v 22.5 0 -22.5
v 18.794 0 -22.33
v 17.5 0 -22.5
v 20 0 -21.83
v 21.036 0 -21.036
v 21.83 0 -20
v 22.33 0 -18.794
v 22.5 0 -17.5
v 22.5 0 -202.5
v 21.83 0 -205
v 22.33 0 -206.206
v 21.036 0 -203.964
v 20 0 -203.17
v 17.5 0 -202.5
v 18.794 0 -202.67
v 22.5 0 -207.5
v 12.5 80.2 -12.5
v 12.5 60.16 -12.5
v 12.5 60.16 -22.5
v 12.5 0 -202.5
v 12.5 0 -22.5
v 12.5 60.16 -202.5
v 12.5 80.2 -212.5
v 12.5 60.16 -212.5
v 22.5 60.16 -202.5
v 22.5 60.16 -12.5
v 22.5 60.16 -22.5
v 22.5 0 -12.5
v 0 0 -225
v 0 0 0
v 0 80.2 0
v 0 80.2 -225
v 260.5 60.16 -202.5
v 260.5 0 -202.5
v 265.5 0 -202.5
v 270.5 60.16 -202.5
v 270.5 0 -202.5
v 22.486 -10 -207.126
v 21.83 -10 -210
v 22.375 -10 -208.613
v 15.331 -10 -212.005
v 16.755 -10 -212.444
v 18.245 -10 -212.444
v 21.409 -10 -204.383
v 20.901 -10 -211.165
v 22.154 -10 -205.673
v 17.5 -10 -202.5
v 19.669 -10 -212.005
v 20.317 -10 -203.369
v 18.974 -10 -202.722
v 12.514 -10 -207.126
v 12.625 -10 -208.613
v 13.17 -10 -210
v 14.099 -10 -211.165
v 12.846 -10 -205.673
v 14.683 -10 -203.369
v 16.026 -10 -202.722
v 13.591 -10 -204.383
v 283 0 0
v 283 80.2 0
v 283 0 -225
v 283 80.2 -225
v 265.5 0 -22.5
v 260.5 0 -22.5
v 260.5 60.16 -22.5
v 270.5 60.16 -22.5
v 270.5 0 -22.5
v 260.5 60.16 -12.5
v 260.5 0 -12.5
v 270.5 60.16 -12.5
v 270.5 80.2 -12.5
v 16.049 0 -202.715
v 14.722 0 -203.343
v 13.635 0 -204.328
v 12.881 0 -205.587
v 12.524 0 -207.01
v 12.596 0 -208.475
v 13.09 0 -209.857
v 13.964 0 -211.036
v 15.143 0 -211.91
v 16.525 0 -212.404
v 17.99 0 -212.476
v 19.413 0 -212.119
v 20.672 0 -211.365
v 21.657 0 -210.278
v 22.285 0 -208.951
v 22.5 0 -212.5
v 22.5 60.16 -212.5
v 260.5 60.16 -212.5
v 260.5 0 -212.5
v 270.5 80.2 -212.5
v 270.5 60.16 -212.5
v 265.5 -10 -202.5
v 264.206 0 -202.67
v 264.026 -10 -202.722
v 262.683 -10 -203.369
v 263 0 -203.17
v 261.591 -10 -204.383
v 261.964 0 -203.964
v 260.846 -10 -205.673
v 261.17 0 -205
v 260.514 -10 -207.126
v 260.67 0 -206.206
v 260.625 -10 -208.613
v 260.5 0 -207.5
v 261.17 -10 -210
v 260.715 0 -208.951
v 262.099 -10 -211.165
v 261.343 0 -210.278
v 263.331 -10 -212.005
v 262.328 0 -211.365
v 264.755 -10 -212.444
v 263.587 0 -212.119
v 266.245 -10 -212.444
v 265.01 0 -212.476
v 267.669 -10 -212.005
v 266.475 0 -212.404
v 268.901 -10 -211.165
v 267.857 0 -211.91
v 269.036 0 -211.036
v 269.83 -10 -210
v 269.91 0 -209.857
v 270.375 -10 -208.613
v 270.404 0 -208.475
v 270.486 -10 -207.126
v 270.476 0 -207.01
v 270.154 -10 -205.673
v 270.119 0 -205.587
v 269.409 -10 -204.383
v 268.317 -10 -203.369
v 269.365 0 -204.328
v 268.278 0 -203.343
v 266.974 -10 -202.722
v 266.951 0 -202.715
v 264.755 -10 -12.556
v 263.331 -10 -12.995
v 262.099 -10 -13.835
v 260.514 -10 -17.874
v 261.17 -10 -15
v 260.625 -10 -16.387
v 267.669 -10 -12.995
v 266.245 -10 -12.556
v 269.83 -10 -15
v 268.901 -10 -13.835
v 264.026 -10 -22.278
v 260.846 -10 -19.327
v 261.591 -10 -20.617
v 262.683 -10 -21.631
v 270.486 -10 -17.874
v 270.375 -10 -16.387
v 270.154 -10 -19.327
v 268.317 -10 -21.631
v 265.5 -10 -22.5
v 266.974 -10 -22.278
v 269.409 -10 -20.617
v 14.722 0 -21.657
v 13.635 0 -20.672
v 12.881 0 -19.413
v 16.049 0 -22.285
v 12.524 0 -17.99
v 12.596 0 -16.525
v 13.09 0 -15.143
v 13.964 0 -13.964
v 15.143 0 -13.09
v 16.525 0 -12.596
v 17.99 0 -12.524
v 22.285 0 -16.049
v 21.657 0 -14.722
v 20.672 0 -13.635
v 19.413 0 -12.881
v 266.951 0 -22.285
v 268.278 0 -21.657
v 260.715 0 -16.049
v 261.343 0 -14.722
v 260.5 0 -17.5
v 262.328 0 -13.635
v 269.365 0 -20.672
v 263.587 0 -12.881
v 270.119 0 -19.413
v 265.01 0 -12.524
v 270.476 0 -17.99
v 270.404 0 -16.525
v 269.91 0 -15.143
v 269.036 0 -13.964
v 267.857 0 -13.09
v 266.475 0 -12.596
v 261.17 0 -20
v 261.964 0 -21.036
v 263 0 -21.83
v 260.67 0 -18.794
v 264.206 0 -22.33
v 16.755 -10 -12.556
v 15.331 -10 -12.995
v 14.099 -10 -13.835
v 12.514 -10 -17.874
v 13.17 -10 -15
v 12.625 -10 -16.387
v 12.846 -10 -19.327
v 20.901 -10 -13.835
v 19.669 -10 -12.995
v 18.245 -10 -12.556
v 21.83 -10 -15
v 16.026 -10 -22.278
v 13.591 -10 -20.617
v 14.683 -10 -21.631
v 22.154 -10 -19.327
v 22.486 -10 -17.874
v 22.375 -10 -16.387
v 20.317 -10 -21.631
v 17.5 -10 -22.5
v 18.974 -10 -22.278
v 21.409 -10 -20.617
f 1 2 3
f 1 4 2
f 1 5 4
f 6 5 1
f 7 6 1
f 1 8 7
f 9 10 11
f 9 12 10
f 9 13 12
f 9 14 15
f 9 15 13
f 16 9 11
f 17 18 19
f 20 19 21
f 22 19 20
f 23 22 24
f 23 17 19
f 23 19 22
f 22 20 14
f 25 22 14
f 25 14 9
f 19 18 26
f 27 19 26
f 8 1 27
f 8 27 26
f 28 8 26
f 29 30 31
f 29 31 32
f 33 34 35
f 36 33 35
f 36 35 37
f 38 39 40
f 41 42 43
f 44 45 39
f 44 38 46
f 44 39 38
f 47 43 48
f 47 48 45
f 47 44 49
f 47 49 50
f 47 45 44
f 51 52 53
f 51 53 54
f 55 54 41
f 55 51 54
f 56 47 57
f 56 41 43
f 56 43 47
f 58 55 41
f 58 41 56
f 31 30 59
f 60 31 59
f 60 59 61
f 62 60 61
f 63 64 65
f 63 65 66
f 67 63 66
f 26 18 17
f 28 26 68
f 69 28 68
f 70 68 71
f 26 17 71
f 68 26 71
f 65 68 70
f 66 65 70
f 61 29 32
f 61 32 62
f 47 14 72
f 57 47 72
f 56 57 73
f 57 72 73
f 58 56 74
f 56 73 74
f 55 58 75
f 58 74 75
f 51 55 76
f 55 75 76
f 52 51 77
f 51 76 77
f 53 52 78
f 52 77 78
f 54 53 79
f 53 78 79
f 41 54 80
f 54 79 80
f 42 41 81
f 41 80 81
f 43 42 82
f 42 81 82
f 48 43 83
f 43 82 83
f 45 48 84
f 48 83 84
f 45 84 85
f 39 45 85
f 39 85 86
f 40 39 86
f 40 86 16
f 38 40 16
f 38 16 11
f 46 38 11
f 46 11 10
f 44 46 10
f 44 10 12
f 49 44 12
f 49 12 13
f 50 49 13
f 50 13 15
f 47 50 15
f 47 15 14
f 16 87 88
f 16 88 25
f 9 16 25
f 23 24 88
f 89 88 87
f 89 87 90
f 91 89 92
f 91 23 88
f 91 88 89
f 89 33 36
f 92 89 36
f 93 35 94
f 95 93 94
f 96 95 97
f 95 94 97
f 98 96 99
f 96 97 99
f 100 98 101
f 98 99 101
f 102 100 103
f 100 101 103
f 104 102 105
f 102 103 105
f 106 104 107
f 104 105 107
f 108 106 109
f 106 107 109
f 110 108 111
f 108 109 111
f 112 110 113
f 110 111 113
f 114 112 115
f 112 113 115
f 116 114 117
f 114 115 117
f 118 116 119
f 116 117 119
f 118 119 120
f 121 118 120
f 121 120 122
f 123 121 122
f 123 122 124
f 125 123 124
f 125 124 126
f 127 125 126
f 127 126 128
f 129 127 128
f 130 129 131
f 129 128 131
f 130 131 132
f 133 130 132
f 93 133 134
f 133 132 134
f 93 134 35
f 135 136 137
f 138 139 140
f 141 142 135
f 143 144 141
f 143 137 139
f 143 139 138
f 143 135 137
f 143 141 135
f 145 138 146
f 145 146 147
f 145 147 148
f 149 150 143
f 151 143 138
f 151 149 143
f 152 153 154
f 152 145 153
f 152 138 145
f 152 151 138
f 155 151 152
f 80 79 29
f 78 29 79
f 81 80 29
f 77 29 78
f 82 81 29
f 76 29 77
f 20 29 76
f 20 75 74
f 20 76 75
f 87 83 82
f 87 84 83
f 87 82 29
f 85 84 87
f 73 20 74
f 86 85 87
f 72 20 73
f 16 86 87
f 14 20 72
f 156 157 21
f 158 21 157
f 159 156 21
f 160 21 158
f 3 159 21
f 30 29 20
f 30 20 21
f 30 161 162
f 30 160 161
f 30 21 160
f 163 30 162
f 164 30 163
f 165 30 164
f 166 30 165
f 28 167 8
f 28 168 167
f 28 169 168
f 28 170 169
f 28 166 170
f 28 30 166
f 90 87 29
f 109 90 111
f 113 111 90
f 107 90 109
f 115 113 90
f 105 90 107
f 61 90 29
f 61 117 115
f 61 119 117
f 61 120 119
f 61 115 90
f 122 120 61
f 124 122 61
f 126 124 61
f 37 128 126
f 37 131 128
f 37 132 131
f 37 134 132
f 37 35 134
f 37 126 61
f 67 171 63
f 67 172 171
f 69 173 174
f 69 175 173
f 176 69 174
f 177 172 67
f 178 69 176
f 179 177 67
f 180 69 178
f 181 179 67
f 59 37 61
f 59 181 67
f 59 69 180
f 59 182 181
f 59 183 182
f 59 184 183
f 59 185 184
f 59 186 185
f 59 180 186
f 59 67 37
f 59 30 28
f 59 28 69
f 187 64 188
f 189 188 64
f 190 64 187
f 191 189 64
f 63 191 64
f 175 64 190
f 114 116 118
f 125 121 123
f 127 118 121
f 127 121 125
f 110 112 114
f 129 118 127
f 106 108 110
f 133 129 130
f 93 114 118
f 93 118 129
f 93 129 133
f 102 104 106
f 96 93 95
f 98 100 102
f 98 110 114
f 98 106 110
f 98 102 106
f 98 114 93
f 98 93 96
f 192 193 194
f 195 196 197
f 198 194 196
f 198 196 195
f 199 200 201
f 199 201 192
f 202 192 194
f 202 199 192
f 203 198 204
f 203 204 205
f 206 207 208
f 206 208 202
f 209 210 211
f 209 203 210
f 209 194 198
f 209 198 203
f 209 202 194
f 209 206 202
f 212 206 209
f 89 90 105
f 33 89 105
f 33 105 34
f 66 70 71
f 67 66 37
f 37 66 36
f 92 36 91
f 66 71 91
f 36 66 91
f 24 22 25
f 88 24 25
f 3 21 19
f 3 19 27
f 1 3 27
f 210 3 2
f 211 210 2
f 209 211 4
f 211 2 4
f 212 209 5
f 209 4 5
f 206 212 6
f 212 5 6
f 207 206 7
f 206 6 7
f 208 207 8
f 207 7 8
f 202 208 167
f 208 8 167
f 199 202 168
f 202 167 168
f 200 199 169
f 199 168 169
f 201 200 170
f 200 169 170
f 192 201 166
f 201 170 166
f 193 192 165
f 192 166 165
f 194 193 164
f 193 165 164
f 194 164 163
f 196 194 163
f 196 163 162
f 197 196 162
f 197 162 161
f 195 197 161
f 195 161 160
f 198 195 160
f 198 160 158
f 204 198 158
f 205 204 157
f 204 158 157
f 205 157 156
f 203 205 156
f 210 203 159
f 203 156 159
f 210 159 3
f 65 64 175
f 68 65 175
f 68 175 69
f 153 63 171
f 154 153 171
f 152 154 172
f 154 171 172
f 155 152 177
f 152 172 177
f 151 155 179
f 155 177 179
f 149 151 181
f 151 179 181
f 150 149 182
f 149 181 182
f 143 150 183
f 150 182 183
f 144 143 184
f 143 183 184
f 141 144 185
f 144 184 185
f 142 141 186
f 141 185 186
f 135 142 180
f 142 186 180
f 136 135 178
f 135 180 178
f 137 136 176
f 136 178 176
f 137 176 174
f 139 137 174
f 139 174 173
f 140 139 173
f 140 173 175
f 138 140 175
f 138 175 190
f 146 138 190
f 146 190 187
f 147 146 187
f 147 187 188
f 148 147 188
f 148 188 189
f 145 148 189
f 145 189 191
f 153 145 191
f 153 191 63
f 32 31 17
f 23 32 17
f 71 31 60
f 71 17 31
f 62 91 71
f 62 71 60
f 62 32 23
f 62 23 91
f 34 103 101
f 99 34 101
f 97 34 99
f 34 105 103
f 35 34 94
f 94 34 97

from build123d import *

# Parameters (mm, degrees)
SKETCH1_W           = 283
SKETCH1_H           = 225
BOSS_EXTRUDE1_DEPTH = 80.2
SKETCH2_W           = 258
SKETCH2_H           = 200
CUT_EXTRUDE1_DEPTH  = 80.2
SKETCH3_W           = 10
SKETCH3_H           = 10
BOSS_EXTRUDE2_DEPTH = 60.16
SKETCH4_R           = 5
BOSS_EXTRUDE3_DEPTH = 10


with BuildPart() as part:
    # Sketch1 → Boss-Extrude1 (new body)
    with BuildSketch(Plane(origin=(0, 0, 0), x_dir=(1, 0, 0), z_dir=(0, 1, 0))):
        with Locations((141.5, 112.5)):
            Rectangle(SKETCH1_W, SKETCH1_H)
    extrude(amount=BOSS_EXTRUDE1_DEPTH)

    # Sketch2 → Cut-Extrude1 (cut)
    with BuildSketch(Plane(origin=(0, 80.2, 0), x_dir=(1, 0, 0), z_dir=(0, 1, 0))):
        with Locations((141.5, 112.5)):
            Rectangle(SKETCH2_W, SKETCH2_H)
    extrude(amount=-CUT_EXTRUDE1_DEPTH, mode=Mode.SUBTRACT)

    # Sketch3 → Boss-Extrude2 (add)
    with BuildSketch(Plane.XZ):
        with Locations((17.5, -17.5)):
            Rectangle(SKETCH3_W, SKETCH3_H)
        with Locations((17.5, -207.5)):
            Rectangle(SKETCH3_W, SKETCH3_H)
        with Locations((265.5, -207.5)):
            Rectangle(SKETCH3_W, SKETCH3_H)
        with Locations((265.5, -17.5)):
            Rectangle(SKETCH3_W, SKETCH3_H)
    extrude(amount=-BOSS_EXTRUDE2_DEPTH)

    # Sketch4 → Boss-Extrude3 (add)
    with BuildSketch(Plane.XZ):
        with Locations(Location((17.5, -17.5, 0), (0, 0, 270))):
            Circle(SKETCH4_R)
        with Locations(Location((265.5, -17.5, 0), (0, 0, 270))):
            Circle(SKETCH4_R)
        with Locations(Location((265.5, -207.5, 0), (0, 0, 90))):
            Circle(SKETCH4_R)
        with Locations(Location((17.5, -207.5, 0), (0, 0, 90))):
            Circle(SKETCH4_R)
    extrude(amount=BOSS_EXTRUDE3_DEPTH)


solid = part.part
